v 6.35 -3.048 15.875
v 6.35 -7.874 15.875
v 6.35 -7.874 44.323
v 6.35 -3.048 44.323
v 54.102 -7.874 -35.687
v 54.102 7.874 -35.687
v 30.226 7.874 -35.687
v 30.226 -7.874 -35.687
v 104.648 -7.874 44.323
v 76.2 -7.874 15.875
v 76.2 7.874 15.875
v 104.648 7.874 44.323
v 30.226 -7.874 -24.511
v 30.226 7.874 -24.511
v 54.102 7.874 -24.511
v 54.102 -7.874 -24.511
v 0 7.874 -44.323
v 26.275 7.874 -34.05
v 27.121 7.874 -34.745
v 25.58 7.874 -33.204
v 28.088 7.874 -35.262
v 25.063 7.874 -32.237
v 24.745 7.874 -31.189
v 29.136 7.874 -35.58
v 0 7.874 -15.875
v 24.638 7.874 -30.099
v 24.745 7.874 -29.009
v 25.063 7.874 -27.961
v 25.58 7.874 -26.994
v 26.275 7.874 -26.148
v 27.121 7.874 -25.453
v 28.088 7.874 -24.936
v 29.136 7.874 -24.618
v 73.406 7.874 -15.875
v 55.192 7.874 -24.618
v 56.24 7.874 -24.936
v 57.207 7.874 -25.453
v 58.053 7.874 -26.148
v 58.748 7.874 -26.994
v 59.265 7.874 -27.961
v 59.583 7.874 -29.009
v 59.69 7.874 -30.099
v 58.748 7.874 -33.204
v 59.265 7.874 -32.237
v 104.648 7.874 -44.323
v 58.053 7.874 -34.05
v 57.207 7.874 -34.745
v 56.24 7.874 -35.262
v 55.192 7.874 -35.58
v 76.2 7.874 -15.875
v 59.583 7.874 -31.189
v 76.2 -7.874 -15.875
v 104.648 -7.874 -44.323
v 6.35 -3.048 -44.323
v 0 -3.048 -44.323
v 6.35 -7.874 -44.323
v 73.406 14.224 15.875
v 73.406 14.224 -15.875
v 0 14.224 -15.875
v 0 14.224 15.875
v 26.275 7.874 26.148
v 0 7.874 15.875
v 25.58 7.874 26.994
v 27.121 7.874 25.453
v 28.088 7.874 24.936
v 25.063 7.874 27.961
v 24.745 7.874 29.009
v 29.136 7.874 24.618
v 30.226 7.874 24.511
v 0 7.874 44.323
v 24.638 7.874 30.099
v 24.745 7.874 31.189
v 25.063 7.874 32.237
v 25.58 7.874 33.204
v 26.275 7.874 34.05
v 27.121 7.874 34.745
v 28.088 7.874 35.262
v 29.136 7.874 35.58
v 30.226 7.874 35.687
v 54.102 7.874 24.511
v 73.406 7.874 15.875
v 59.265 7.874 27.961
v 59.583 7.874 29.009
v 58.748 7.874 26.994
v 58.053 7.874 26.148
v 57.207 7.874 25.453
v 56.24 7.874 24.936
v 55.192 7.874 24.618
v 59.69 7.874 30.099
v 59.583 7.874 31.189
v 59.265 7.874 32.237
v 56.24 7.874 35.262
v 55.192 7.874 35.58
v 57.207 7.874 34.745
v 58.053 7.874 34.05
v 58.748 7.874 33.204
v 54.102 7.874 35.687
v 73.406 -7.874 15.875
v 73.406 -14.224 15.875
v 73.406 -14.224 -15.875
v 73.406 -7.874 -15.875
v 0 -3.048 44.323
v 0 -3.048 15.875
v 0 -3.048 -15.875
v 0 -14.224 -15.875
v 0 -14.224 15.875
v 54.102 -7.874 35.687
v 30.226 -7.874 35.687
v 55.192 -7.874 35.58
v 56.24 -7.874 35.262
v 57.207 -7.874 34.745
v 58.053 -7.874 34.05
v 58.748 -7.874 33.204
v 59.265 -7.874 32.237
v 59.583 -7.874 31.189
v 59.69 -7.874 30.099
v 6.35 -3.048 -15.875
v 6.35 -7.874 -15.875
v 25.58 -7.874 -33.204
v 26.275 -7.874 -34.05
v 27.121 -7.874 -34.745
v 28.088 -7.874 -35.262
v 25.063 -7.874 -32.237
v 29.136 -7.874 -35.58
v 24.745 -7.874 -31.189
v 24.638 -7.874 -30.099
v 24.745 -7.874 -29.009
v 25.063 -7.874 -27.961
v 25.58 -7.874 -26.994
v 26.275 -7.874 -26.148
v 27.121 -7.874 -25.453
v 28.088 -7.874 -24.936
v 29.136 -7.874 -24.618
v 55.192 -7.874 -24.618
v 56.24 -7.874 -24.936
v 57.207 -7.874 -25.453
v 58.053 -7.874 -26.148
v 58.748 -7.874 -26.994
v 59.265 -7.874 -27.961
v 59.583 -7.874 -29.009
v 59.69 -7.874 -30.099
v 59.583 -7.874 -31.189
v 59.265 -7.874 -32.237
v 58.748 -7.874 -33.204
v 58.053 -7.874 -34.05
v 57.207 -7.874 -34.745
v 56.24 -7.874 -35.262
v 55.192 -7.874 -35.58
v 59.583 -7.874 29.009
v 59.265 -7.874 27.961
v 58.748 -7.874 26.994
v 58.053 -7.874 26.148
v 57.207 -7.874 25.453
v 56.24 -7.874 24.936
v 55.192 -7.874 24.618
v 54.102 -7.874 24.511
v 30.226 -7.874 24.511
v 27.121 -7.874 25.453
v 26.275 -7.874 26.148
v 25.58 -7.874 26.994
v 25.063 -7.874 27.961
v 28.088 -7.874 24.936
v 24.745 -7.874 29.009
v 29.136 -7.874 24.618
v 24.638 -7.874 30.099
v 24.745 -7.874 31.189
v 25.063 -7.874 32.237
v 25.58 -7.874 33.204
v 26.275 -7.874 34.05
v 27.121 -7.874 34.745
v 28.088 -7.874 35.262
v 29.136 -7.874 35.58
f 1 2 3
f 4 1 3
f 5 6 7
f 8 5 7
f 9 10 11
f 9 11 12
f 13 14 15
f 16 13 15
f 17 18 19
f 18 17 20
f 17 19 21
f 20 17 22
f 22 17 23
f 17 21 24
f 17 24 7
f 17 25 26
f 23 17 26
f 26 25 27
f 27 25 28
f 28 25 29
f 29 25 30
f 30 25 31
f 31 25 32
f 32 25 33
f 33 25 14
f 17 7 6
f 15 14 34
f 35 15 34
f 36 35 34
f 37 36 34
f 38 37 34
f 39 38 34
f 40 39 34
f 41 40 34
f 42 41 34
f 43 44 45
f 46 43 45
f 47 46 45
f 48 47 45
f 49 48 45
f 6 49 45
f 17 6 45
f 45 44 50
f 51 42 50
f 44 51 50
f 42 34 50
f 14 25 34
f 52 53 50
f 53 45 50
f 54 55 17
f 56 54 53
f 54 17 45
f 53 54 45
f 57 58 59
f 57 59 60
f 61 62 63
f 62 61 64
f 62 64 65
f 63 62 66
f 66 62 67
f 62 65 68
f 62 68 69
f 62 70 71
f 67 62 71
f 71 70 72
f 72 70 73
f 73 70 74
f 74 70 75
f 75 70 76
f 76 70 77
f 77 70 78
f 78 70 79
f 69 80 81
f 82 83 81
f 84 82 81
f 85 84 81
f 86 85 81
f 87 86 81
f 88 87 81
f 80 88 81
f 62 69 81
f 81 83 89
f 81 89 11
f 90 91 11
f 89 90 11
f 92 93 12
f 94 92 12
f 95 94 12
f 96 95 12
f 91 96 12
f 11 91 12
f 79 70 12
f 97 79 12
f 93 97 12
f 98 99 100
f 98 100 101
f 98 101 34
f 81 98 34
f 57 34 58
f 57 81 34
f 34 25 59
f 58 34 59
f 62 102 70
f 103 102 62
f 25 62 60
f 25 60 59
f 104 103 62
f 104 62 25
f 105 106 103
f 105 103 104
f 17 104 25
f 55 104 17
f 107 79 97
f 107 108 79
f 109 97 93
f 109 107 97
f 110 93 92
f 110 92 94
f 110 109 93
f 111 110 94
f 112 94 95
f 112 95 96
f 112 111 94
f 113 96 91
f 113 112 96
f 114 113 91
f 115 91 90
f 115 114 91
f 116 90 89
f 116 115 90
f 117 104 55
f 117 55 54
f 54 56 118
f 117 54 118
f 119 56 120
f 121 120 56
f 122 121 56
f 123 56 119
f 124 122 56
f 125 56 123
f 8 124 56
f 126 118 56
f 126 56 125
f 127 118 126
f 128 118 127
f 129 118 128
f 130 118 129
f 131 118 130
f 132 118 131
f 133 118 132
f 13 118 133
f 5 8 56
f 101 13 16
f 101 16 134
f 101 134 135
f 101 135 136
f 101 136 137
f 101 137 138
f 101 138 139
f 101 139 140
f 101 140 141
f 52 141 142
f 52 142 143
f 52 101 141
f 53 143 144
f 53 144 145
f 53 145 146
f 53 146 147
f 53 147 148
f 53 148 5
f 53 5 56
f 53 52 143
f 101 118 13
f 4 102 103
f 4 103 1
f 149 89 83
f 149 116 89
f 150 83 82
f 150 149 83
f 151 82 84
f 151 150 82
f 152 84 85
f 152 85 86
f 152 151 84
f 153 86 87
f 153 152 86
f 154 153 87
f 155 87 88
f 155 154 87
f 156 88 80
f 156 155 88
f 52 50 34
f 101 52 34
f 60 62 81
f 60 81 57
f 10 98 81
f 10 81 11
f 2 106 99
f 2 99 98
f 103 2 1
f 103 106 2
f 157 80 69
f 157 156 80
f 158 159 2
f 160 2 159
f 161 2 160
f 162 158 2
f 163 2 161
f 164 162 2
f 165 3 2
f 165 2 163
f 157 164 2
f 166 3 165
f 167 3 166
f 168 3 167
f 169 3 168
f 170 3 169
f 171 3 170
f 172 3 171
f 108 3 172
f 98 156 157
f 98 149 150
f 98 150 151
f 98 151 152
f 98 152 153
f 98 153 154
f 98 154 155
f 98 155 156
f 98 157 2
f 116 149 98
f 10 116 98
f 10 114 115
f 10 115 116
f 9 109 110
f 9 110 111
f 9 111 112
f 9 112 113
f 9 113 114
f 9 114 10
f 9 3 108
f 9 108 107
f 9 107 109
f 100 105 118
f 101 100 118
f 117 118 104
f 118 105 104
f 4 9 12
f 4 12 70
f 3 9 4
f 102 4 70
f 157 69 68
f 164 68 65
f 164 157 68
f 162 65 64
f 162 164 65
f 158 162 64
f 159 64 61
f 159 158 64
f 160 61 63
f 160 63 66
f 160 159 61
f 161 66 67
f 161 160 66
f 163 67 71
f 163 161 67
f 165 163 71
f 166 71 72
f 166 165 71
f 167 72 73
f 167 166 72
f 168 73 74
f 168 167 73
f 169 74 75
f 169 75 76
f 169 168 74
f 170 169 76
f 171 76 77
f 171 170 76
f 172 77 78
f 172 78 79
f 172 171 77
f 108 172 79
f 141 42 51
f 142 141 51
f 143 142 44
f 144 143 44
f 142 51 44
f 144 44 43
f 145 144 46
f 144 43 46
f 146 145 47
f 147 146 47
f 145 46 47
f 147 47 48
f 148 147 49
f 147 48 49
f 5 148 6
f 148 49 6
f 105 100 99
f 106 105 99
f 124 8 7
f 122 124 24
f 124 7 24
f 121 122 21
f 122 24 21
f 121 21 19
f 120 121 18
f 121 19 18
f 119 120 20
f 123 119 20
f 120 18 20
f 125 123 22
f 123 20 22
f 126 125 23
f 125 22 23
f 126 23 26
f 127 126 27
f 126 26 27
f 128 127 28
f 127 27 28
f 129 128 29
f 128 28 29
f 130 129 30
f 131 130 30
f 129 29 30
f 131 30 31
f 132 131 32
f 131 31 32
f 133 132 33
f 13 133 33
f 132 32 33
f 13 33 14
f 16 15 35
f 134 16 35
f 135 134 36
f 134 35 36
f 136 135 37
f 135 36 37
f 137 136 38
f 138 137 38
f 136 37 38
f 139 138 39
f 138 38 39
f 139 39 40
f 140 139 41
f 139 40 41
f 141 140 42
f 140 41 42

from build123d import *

# Parameters (mm, degrees)
F0_W     = 28.448
F0_H     = 31.75
F1_DEPTH = 73.406
F3_DEPTH = 7.874
F5_W     = 6.35
F5_H     = 28.448
F6_DEPTH = 4.826
F7_W     = 6.35
F7_H     = 28.448
F8_DEPTH = 4.826


with BuildPart() as f1:
    # F0 (on Right) → F1 (new body)
    with BuildSketch(Plane.YZ):
        Rectangle(F0_W, F0_H)
    extrude(amount=F1_DEPTH)

    # F2 (on Front) → F3 (join, symmetric)
    with BuildSketch(Plane.XZ):
        Polygon((0, -44.323), (104.648, -44.323), (76.2, -15.875), (73.406, -15.875), (0, -15.875), align=None)
        with BuildLine():
            ThreePointArc((30.226, -35.687), (24.638, -30.099), (30.226, -24.511))
            Line((30.226, -24.511), (54.102, -24.511))
            ThreePointArc((54.102, -24.511), (58.053313, -26.147687), (59.69, -30.099))
            ThreePointArc((59.69, -30.099), (58.053313, -34.050313), (54.102, -35.687))
            Line((54.102, -35.687), (30.226, -35.687))
        make_face(mode=Mode.SUBTRACT)
        Polygon((0, 15.875), (73.406, 15.875), (76.2, 15.875), (104.648, 44.323), (0, 44.323), align=None)
        with BuildLine():
            ThreePointArc((30.226, 24.511), (24.638, 30.099), (30.226, 35.687))
            Line((30.226, 35.687), (54.102, 35.687))
            ThreePointArc((54.102, 35.687), (58.053313, 34.050313), (59.69, 30.099))
            ThreePointArc((59.69, 30.099), (58.053313, 26.147687), (54.102, 24.511))
            Line((54.102, 24.511), (30.226, 24.511))
        make_face(mode=Mode.SUBTRACT)
    extrude(amount=F3_DEPTH, both=True)

    # F5 (on face) → F6 (cut)
    with BuildSketch(Plane.XZ.offset(7.874)):
        with Locations((3.175, 30.099)):
            Rectangle(F5_W, F5_H)
    extrude(amount=-F6_DEPTH, mode=Mode.SUBTRACT)

    # F7 (on face) → F8 (cut)
    with BuildSketch(Plane.XZ.offset(7.874)):
        with Locations((3.175, -30.099)):
            Rectangle(F7_W, F7_H)
    extrude(amount=-F8_DEPTH, mode=Mode.SUBTRACT)


solid = f1.part
